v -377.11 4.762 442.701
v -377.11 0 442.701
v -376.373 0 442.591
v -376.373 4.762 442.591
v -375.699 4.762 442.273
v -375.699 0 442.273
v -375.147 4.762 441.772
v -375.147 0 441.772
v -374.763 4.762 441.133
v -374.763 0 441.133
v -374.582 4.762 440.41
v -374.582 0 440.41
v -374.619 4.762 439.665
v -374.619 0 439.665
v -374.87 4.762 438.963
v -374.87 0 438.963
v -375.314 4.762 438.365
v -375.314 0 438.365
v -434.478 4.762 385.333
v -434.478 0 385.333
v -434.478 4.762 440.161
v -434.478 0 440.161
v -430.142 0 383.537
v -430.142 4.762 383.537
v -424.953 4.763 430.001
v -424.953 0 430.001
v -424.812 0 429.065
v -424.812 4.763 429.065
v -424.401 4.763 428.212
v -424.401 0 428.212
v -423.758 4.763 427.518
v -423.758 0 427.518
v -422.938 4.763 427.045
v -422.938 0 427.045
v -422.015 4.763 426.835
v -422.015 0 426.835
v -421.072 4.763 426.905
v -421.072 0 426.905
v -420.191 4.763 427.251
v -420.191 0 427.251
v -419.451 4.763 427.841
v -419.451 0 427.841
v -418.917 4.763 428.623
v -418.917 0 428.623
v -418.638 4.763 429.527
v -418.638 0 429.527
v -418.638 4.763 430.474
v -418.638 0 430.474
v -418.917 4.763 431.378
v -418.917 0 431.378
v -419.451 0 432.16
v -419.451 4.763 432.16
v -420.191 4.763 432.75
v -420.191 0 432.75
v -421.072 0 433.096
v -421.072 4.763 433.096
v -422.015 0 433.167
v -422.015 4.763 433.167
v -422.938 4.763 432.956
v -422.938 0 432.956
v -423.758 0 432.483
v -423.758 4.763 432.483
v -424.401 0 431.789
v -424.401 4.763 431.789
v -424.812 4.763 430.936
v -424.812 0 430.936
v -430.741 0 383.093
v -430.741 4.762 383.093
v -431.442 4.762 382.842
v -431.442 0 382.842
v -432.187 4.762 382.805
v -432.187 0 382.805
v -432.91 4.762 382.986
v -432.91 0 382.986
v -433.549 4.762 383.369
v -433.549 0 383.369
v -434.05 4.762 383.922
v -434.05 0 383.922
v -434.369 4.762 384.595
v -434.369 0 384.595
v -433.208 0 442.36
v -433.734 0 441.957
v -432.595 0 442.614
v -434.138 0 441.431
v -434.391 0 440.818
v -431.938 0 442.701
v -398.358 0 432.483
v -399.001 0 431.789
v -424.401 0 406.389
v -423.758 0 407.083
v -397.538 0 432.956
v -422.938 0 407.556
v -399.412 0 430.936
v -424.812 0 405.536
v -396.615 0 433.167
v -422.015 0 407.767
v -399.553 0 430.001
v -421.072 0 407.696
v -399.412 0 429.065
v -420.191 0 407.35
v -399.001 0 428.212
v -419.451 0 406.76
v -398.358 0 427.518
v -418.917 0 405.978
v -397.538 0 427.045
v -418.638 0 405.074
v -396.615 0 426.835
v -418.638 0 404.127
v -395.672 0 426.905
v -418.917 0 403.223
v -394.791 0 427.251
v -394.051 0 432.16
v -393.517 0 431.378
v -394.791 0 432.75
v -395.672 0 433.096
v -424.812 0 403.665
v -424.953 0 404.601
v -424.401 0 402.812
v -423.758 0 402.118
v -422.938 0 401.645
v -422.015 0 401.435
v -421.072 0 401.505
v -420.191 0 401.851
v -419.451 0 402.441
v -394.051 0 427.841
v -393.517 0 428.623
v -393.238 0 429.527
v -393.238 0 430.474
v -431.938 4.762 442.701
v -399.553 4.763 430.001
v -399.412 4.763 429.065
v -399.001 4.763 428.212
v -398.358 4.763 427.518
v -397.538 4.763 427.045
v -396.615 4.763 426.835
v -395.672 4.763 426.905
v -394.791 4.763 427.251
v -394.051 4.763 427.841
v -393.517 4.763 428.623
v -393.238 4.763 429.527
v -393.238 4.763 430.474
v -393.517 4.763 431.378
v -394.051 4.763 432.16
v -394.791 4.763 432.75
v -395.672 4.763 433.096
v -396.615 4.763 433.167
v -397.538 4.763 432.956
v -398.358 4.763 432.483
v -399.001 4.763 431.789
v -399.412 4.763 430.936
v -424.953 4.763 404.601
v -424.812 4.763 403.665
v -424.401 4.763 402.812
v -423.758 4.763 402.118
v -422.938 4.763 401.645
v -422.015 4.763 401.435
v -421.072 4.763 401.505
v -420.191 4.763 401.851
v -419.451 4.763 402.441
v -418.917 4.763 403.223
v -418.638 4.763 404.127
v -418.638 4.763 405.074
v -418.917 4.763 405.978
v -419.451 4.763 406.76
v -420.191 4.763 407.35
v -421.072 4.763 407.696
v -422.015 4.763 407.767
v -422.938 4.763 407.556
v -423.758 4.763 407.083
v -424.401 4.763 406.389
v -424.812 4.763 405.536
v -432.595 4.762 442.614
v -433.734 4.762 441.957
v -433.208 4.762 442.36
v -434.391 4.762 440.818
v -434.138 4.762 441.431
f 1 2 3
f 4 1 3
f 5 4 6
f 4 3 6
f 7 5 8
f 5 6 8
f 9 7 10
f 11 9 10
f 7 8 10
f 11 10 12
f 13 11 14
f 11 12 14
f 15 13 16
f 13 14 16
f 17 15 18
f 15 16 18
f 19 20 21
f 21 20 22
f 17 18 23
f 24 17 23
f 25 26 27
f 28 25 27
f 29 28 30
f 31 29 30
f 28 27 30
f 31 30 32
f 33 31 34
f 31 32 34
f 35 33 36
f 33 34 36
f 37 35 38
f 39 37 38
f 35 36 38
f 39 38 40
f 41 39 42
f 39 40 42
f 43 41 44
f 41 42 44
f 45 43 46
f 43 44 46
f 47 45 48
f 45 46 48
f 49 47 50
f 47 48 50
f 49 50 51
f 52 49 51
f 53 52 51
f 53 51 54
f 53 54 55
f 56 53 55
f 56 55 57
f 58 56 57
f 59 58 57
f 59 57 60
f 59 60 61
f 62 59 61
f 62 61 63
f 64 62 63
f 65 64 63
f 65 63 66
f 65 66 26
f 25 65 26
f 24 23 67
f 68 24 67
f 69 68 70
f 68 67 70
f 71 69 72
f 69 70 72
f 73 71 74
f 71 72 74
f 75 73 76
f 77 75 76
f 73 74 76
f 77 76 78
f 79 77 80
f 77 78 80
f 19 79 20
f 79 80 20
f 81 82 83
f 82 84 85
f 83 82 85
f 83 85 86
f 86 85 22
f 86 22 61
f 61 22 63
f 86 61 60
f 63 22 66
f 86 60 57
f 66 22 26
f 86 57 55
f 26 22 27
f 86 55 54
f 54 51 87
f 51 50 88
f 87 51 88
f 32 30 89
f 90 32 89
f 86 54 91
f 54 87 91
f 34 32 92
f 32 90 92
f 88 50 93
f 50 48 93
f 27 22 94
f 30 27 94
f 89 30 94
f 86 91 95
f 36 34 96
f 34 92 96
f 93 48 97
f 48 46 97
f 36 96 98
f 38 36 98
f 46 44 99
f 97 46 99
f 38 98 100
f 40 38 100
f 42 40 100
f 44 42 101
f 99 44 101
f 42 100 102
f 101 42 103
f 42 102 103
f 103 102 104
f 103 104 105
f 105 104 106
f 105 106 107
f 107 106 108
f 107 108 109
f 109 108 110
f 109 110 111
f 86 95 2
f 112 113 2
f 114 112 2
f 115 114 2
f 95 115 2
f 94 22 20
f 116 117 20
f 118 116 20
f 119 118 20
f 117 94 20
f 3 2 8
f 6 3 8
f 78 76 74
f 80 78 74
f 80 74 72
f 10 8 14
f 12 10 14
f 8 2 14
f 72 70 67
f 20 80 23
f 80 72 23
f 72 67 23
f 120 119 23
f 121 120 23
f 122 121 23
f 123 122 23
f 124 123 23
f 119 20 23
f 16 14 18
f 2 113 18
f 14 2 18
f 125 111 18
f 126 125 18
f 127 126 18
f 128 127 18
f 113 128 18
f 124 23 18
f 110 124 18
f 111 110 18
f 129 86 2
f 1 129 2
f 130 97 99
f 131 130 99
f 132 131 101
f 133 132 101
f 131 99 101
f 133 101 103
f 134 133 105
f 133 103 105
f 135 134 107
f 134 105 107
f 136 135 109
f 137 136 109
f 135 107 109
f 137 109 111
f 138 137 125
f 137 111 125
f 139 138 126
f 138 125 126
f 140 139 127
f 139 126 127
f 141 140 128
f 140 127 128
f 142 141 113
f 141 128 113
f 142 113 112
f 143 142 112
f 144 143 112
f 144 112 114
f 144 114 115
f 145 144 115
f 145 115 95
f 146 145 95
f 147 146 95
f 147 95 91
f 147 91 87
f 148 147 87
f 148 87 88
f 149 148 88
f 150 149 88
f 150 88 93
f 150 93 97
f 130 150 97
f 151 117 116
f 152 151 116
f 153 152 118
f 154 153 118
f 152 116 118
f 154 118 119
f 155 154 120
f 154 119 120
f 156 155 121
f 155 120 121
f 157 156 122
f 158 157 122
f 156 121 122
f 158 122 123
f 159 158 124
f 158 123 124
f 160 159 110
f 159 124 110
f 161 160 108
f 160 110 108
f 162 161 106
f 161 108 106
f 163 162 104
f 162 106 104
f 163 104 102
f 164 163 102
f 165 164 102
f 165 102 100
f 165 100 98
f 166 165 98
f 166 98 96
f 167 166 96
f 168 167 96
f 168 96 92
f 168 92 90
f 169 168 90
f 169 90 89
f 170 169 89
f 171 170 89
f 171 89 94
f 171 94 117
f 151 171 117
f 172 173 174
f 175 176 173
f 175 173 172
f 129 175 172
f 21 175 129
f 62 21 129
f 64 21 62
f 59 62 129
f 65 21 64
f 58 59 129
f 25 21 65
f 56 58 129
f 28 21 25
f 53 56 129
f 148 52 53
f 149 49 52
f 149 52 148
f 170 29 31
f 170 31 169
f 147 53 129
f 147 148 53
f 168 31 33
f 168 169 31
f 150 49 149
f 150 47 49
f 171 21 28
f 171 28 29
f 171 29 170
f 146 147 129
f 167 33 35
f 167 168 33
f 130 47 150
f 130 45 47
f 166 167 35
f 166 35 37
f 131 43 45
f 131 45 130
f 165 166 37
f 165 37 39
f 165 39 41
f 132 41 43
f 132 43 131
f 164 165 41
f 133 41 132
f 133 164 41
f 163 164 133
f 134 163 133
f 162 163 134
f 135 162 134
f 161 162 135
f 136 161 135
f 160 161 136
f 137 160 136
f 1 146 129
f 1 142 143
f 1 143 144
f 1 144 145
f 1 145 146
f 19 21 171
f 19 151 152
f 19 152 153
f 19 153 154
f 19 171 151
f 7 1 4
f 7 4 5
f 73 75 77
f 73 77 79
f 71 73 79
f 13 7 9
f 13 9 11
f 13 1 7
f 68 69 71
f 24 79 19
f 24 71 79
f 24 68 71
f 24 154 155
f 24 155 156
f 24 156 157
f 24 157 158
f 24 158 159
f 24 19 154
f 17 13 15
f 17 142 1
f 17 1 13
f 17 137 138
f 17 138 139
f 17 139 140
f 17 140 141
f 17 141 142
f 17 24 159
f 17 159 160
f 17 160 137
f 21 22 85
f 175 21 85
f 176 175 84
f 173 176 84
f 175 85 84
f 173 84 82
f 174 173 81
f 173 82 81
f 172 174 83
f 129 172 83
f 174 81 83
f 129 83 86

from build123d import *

# Parameters (mm, degrees)
BOSS_EXTRUDE1_DEPTH         = 4.7625
F_1_4_0_25_DIAMETER_HOLE1_D = 6.35


with BuildPart() as part:
    # Sketch1 → Boss-Extrude1 (new body)
    with BuildSketch(Plane(origin=(0, 0, 0), x_dir=(1, 0, 0), z_dir=(0, 1, 0))):
        with BuildLine():
            Line((-431.938028743, -442.700646237), (-377.110131192, -442.700646237))
            ThreePointArc((-377.110131192, -442.700646237), (-374.763477179, -441.132662155), (-375.314079967, -438.364595013))
            Line((-375.314079967, -438.364595013), (-430.141977519, -383.536697461))
            ThreePointArc((-430.141977519, -383.536697461), (-432.910044661, -382.986094673), (-434.478028743, -385.332748685))
            Line((-434.478028743, -385.332748685), (-434.478028743, -440.160646237))
            ThreePointArc((-434.478028743, -440.160646237), (-433.734079967, -441.956697461), (-431.938028743, -442.700646237))
        make_face()
    extrude(amount=BOSS_EXTRUDE1_DEPTH)

    # 1/4 (0.25) Diameter Hole1 (through all)
    with Locations(Plane(origin=(0, 4.7625, 0), x_dir=(1, 0, 0), z_dir=(0, 1, 0))):
        with Locations((-421.778028743, -404.600646237), (-421.778028743, -430.000646237), (-396.378028743, -430.000646237)):
            Hole(F_1_4_0_25_DIAMETER_HOLE1_D / 2)


solid = part.part
